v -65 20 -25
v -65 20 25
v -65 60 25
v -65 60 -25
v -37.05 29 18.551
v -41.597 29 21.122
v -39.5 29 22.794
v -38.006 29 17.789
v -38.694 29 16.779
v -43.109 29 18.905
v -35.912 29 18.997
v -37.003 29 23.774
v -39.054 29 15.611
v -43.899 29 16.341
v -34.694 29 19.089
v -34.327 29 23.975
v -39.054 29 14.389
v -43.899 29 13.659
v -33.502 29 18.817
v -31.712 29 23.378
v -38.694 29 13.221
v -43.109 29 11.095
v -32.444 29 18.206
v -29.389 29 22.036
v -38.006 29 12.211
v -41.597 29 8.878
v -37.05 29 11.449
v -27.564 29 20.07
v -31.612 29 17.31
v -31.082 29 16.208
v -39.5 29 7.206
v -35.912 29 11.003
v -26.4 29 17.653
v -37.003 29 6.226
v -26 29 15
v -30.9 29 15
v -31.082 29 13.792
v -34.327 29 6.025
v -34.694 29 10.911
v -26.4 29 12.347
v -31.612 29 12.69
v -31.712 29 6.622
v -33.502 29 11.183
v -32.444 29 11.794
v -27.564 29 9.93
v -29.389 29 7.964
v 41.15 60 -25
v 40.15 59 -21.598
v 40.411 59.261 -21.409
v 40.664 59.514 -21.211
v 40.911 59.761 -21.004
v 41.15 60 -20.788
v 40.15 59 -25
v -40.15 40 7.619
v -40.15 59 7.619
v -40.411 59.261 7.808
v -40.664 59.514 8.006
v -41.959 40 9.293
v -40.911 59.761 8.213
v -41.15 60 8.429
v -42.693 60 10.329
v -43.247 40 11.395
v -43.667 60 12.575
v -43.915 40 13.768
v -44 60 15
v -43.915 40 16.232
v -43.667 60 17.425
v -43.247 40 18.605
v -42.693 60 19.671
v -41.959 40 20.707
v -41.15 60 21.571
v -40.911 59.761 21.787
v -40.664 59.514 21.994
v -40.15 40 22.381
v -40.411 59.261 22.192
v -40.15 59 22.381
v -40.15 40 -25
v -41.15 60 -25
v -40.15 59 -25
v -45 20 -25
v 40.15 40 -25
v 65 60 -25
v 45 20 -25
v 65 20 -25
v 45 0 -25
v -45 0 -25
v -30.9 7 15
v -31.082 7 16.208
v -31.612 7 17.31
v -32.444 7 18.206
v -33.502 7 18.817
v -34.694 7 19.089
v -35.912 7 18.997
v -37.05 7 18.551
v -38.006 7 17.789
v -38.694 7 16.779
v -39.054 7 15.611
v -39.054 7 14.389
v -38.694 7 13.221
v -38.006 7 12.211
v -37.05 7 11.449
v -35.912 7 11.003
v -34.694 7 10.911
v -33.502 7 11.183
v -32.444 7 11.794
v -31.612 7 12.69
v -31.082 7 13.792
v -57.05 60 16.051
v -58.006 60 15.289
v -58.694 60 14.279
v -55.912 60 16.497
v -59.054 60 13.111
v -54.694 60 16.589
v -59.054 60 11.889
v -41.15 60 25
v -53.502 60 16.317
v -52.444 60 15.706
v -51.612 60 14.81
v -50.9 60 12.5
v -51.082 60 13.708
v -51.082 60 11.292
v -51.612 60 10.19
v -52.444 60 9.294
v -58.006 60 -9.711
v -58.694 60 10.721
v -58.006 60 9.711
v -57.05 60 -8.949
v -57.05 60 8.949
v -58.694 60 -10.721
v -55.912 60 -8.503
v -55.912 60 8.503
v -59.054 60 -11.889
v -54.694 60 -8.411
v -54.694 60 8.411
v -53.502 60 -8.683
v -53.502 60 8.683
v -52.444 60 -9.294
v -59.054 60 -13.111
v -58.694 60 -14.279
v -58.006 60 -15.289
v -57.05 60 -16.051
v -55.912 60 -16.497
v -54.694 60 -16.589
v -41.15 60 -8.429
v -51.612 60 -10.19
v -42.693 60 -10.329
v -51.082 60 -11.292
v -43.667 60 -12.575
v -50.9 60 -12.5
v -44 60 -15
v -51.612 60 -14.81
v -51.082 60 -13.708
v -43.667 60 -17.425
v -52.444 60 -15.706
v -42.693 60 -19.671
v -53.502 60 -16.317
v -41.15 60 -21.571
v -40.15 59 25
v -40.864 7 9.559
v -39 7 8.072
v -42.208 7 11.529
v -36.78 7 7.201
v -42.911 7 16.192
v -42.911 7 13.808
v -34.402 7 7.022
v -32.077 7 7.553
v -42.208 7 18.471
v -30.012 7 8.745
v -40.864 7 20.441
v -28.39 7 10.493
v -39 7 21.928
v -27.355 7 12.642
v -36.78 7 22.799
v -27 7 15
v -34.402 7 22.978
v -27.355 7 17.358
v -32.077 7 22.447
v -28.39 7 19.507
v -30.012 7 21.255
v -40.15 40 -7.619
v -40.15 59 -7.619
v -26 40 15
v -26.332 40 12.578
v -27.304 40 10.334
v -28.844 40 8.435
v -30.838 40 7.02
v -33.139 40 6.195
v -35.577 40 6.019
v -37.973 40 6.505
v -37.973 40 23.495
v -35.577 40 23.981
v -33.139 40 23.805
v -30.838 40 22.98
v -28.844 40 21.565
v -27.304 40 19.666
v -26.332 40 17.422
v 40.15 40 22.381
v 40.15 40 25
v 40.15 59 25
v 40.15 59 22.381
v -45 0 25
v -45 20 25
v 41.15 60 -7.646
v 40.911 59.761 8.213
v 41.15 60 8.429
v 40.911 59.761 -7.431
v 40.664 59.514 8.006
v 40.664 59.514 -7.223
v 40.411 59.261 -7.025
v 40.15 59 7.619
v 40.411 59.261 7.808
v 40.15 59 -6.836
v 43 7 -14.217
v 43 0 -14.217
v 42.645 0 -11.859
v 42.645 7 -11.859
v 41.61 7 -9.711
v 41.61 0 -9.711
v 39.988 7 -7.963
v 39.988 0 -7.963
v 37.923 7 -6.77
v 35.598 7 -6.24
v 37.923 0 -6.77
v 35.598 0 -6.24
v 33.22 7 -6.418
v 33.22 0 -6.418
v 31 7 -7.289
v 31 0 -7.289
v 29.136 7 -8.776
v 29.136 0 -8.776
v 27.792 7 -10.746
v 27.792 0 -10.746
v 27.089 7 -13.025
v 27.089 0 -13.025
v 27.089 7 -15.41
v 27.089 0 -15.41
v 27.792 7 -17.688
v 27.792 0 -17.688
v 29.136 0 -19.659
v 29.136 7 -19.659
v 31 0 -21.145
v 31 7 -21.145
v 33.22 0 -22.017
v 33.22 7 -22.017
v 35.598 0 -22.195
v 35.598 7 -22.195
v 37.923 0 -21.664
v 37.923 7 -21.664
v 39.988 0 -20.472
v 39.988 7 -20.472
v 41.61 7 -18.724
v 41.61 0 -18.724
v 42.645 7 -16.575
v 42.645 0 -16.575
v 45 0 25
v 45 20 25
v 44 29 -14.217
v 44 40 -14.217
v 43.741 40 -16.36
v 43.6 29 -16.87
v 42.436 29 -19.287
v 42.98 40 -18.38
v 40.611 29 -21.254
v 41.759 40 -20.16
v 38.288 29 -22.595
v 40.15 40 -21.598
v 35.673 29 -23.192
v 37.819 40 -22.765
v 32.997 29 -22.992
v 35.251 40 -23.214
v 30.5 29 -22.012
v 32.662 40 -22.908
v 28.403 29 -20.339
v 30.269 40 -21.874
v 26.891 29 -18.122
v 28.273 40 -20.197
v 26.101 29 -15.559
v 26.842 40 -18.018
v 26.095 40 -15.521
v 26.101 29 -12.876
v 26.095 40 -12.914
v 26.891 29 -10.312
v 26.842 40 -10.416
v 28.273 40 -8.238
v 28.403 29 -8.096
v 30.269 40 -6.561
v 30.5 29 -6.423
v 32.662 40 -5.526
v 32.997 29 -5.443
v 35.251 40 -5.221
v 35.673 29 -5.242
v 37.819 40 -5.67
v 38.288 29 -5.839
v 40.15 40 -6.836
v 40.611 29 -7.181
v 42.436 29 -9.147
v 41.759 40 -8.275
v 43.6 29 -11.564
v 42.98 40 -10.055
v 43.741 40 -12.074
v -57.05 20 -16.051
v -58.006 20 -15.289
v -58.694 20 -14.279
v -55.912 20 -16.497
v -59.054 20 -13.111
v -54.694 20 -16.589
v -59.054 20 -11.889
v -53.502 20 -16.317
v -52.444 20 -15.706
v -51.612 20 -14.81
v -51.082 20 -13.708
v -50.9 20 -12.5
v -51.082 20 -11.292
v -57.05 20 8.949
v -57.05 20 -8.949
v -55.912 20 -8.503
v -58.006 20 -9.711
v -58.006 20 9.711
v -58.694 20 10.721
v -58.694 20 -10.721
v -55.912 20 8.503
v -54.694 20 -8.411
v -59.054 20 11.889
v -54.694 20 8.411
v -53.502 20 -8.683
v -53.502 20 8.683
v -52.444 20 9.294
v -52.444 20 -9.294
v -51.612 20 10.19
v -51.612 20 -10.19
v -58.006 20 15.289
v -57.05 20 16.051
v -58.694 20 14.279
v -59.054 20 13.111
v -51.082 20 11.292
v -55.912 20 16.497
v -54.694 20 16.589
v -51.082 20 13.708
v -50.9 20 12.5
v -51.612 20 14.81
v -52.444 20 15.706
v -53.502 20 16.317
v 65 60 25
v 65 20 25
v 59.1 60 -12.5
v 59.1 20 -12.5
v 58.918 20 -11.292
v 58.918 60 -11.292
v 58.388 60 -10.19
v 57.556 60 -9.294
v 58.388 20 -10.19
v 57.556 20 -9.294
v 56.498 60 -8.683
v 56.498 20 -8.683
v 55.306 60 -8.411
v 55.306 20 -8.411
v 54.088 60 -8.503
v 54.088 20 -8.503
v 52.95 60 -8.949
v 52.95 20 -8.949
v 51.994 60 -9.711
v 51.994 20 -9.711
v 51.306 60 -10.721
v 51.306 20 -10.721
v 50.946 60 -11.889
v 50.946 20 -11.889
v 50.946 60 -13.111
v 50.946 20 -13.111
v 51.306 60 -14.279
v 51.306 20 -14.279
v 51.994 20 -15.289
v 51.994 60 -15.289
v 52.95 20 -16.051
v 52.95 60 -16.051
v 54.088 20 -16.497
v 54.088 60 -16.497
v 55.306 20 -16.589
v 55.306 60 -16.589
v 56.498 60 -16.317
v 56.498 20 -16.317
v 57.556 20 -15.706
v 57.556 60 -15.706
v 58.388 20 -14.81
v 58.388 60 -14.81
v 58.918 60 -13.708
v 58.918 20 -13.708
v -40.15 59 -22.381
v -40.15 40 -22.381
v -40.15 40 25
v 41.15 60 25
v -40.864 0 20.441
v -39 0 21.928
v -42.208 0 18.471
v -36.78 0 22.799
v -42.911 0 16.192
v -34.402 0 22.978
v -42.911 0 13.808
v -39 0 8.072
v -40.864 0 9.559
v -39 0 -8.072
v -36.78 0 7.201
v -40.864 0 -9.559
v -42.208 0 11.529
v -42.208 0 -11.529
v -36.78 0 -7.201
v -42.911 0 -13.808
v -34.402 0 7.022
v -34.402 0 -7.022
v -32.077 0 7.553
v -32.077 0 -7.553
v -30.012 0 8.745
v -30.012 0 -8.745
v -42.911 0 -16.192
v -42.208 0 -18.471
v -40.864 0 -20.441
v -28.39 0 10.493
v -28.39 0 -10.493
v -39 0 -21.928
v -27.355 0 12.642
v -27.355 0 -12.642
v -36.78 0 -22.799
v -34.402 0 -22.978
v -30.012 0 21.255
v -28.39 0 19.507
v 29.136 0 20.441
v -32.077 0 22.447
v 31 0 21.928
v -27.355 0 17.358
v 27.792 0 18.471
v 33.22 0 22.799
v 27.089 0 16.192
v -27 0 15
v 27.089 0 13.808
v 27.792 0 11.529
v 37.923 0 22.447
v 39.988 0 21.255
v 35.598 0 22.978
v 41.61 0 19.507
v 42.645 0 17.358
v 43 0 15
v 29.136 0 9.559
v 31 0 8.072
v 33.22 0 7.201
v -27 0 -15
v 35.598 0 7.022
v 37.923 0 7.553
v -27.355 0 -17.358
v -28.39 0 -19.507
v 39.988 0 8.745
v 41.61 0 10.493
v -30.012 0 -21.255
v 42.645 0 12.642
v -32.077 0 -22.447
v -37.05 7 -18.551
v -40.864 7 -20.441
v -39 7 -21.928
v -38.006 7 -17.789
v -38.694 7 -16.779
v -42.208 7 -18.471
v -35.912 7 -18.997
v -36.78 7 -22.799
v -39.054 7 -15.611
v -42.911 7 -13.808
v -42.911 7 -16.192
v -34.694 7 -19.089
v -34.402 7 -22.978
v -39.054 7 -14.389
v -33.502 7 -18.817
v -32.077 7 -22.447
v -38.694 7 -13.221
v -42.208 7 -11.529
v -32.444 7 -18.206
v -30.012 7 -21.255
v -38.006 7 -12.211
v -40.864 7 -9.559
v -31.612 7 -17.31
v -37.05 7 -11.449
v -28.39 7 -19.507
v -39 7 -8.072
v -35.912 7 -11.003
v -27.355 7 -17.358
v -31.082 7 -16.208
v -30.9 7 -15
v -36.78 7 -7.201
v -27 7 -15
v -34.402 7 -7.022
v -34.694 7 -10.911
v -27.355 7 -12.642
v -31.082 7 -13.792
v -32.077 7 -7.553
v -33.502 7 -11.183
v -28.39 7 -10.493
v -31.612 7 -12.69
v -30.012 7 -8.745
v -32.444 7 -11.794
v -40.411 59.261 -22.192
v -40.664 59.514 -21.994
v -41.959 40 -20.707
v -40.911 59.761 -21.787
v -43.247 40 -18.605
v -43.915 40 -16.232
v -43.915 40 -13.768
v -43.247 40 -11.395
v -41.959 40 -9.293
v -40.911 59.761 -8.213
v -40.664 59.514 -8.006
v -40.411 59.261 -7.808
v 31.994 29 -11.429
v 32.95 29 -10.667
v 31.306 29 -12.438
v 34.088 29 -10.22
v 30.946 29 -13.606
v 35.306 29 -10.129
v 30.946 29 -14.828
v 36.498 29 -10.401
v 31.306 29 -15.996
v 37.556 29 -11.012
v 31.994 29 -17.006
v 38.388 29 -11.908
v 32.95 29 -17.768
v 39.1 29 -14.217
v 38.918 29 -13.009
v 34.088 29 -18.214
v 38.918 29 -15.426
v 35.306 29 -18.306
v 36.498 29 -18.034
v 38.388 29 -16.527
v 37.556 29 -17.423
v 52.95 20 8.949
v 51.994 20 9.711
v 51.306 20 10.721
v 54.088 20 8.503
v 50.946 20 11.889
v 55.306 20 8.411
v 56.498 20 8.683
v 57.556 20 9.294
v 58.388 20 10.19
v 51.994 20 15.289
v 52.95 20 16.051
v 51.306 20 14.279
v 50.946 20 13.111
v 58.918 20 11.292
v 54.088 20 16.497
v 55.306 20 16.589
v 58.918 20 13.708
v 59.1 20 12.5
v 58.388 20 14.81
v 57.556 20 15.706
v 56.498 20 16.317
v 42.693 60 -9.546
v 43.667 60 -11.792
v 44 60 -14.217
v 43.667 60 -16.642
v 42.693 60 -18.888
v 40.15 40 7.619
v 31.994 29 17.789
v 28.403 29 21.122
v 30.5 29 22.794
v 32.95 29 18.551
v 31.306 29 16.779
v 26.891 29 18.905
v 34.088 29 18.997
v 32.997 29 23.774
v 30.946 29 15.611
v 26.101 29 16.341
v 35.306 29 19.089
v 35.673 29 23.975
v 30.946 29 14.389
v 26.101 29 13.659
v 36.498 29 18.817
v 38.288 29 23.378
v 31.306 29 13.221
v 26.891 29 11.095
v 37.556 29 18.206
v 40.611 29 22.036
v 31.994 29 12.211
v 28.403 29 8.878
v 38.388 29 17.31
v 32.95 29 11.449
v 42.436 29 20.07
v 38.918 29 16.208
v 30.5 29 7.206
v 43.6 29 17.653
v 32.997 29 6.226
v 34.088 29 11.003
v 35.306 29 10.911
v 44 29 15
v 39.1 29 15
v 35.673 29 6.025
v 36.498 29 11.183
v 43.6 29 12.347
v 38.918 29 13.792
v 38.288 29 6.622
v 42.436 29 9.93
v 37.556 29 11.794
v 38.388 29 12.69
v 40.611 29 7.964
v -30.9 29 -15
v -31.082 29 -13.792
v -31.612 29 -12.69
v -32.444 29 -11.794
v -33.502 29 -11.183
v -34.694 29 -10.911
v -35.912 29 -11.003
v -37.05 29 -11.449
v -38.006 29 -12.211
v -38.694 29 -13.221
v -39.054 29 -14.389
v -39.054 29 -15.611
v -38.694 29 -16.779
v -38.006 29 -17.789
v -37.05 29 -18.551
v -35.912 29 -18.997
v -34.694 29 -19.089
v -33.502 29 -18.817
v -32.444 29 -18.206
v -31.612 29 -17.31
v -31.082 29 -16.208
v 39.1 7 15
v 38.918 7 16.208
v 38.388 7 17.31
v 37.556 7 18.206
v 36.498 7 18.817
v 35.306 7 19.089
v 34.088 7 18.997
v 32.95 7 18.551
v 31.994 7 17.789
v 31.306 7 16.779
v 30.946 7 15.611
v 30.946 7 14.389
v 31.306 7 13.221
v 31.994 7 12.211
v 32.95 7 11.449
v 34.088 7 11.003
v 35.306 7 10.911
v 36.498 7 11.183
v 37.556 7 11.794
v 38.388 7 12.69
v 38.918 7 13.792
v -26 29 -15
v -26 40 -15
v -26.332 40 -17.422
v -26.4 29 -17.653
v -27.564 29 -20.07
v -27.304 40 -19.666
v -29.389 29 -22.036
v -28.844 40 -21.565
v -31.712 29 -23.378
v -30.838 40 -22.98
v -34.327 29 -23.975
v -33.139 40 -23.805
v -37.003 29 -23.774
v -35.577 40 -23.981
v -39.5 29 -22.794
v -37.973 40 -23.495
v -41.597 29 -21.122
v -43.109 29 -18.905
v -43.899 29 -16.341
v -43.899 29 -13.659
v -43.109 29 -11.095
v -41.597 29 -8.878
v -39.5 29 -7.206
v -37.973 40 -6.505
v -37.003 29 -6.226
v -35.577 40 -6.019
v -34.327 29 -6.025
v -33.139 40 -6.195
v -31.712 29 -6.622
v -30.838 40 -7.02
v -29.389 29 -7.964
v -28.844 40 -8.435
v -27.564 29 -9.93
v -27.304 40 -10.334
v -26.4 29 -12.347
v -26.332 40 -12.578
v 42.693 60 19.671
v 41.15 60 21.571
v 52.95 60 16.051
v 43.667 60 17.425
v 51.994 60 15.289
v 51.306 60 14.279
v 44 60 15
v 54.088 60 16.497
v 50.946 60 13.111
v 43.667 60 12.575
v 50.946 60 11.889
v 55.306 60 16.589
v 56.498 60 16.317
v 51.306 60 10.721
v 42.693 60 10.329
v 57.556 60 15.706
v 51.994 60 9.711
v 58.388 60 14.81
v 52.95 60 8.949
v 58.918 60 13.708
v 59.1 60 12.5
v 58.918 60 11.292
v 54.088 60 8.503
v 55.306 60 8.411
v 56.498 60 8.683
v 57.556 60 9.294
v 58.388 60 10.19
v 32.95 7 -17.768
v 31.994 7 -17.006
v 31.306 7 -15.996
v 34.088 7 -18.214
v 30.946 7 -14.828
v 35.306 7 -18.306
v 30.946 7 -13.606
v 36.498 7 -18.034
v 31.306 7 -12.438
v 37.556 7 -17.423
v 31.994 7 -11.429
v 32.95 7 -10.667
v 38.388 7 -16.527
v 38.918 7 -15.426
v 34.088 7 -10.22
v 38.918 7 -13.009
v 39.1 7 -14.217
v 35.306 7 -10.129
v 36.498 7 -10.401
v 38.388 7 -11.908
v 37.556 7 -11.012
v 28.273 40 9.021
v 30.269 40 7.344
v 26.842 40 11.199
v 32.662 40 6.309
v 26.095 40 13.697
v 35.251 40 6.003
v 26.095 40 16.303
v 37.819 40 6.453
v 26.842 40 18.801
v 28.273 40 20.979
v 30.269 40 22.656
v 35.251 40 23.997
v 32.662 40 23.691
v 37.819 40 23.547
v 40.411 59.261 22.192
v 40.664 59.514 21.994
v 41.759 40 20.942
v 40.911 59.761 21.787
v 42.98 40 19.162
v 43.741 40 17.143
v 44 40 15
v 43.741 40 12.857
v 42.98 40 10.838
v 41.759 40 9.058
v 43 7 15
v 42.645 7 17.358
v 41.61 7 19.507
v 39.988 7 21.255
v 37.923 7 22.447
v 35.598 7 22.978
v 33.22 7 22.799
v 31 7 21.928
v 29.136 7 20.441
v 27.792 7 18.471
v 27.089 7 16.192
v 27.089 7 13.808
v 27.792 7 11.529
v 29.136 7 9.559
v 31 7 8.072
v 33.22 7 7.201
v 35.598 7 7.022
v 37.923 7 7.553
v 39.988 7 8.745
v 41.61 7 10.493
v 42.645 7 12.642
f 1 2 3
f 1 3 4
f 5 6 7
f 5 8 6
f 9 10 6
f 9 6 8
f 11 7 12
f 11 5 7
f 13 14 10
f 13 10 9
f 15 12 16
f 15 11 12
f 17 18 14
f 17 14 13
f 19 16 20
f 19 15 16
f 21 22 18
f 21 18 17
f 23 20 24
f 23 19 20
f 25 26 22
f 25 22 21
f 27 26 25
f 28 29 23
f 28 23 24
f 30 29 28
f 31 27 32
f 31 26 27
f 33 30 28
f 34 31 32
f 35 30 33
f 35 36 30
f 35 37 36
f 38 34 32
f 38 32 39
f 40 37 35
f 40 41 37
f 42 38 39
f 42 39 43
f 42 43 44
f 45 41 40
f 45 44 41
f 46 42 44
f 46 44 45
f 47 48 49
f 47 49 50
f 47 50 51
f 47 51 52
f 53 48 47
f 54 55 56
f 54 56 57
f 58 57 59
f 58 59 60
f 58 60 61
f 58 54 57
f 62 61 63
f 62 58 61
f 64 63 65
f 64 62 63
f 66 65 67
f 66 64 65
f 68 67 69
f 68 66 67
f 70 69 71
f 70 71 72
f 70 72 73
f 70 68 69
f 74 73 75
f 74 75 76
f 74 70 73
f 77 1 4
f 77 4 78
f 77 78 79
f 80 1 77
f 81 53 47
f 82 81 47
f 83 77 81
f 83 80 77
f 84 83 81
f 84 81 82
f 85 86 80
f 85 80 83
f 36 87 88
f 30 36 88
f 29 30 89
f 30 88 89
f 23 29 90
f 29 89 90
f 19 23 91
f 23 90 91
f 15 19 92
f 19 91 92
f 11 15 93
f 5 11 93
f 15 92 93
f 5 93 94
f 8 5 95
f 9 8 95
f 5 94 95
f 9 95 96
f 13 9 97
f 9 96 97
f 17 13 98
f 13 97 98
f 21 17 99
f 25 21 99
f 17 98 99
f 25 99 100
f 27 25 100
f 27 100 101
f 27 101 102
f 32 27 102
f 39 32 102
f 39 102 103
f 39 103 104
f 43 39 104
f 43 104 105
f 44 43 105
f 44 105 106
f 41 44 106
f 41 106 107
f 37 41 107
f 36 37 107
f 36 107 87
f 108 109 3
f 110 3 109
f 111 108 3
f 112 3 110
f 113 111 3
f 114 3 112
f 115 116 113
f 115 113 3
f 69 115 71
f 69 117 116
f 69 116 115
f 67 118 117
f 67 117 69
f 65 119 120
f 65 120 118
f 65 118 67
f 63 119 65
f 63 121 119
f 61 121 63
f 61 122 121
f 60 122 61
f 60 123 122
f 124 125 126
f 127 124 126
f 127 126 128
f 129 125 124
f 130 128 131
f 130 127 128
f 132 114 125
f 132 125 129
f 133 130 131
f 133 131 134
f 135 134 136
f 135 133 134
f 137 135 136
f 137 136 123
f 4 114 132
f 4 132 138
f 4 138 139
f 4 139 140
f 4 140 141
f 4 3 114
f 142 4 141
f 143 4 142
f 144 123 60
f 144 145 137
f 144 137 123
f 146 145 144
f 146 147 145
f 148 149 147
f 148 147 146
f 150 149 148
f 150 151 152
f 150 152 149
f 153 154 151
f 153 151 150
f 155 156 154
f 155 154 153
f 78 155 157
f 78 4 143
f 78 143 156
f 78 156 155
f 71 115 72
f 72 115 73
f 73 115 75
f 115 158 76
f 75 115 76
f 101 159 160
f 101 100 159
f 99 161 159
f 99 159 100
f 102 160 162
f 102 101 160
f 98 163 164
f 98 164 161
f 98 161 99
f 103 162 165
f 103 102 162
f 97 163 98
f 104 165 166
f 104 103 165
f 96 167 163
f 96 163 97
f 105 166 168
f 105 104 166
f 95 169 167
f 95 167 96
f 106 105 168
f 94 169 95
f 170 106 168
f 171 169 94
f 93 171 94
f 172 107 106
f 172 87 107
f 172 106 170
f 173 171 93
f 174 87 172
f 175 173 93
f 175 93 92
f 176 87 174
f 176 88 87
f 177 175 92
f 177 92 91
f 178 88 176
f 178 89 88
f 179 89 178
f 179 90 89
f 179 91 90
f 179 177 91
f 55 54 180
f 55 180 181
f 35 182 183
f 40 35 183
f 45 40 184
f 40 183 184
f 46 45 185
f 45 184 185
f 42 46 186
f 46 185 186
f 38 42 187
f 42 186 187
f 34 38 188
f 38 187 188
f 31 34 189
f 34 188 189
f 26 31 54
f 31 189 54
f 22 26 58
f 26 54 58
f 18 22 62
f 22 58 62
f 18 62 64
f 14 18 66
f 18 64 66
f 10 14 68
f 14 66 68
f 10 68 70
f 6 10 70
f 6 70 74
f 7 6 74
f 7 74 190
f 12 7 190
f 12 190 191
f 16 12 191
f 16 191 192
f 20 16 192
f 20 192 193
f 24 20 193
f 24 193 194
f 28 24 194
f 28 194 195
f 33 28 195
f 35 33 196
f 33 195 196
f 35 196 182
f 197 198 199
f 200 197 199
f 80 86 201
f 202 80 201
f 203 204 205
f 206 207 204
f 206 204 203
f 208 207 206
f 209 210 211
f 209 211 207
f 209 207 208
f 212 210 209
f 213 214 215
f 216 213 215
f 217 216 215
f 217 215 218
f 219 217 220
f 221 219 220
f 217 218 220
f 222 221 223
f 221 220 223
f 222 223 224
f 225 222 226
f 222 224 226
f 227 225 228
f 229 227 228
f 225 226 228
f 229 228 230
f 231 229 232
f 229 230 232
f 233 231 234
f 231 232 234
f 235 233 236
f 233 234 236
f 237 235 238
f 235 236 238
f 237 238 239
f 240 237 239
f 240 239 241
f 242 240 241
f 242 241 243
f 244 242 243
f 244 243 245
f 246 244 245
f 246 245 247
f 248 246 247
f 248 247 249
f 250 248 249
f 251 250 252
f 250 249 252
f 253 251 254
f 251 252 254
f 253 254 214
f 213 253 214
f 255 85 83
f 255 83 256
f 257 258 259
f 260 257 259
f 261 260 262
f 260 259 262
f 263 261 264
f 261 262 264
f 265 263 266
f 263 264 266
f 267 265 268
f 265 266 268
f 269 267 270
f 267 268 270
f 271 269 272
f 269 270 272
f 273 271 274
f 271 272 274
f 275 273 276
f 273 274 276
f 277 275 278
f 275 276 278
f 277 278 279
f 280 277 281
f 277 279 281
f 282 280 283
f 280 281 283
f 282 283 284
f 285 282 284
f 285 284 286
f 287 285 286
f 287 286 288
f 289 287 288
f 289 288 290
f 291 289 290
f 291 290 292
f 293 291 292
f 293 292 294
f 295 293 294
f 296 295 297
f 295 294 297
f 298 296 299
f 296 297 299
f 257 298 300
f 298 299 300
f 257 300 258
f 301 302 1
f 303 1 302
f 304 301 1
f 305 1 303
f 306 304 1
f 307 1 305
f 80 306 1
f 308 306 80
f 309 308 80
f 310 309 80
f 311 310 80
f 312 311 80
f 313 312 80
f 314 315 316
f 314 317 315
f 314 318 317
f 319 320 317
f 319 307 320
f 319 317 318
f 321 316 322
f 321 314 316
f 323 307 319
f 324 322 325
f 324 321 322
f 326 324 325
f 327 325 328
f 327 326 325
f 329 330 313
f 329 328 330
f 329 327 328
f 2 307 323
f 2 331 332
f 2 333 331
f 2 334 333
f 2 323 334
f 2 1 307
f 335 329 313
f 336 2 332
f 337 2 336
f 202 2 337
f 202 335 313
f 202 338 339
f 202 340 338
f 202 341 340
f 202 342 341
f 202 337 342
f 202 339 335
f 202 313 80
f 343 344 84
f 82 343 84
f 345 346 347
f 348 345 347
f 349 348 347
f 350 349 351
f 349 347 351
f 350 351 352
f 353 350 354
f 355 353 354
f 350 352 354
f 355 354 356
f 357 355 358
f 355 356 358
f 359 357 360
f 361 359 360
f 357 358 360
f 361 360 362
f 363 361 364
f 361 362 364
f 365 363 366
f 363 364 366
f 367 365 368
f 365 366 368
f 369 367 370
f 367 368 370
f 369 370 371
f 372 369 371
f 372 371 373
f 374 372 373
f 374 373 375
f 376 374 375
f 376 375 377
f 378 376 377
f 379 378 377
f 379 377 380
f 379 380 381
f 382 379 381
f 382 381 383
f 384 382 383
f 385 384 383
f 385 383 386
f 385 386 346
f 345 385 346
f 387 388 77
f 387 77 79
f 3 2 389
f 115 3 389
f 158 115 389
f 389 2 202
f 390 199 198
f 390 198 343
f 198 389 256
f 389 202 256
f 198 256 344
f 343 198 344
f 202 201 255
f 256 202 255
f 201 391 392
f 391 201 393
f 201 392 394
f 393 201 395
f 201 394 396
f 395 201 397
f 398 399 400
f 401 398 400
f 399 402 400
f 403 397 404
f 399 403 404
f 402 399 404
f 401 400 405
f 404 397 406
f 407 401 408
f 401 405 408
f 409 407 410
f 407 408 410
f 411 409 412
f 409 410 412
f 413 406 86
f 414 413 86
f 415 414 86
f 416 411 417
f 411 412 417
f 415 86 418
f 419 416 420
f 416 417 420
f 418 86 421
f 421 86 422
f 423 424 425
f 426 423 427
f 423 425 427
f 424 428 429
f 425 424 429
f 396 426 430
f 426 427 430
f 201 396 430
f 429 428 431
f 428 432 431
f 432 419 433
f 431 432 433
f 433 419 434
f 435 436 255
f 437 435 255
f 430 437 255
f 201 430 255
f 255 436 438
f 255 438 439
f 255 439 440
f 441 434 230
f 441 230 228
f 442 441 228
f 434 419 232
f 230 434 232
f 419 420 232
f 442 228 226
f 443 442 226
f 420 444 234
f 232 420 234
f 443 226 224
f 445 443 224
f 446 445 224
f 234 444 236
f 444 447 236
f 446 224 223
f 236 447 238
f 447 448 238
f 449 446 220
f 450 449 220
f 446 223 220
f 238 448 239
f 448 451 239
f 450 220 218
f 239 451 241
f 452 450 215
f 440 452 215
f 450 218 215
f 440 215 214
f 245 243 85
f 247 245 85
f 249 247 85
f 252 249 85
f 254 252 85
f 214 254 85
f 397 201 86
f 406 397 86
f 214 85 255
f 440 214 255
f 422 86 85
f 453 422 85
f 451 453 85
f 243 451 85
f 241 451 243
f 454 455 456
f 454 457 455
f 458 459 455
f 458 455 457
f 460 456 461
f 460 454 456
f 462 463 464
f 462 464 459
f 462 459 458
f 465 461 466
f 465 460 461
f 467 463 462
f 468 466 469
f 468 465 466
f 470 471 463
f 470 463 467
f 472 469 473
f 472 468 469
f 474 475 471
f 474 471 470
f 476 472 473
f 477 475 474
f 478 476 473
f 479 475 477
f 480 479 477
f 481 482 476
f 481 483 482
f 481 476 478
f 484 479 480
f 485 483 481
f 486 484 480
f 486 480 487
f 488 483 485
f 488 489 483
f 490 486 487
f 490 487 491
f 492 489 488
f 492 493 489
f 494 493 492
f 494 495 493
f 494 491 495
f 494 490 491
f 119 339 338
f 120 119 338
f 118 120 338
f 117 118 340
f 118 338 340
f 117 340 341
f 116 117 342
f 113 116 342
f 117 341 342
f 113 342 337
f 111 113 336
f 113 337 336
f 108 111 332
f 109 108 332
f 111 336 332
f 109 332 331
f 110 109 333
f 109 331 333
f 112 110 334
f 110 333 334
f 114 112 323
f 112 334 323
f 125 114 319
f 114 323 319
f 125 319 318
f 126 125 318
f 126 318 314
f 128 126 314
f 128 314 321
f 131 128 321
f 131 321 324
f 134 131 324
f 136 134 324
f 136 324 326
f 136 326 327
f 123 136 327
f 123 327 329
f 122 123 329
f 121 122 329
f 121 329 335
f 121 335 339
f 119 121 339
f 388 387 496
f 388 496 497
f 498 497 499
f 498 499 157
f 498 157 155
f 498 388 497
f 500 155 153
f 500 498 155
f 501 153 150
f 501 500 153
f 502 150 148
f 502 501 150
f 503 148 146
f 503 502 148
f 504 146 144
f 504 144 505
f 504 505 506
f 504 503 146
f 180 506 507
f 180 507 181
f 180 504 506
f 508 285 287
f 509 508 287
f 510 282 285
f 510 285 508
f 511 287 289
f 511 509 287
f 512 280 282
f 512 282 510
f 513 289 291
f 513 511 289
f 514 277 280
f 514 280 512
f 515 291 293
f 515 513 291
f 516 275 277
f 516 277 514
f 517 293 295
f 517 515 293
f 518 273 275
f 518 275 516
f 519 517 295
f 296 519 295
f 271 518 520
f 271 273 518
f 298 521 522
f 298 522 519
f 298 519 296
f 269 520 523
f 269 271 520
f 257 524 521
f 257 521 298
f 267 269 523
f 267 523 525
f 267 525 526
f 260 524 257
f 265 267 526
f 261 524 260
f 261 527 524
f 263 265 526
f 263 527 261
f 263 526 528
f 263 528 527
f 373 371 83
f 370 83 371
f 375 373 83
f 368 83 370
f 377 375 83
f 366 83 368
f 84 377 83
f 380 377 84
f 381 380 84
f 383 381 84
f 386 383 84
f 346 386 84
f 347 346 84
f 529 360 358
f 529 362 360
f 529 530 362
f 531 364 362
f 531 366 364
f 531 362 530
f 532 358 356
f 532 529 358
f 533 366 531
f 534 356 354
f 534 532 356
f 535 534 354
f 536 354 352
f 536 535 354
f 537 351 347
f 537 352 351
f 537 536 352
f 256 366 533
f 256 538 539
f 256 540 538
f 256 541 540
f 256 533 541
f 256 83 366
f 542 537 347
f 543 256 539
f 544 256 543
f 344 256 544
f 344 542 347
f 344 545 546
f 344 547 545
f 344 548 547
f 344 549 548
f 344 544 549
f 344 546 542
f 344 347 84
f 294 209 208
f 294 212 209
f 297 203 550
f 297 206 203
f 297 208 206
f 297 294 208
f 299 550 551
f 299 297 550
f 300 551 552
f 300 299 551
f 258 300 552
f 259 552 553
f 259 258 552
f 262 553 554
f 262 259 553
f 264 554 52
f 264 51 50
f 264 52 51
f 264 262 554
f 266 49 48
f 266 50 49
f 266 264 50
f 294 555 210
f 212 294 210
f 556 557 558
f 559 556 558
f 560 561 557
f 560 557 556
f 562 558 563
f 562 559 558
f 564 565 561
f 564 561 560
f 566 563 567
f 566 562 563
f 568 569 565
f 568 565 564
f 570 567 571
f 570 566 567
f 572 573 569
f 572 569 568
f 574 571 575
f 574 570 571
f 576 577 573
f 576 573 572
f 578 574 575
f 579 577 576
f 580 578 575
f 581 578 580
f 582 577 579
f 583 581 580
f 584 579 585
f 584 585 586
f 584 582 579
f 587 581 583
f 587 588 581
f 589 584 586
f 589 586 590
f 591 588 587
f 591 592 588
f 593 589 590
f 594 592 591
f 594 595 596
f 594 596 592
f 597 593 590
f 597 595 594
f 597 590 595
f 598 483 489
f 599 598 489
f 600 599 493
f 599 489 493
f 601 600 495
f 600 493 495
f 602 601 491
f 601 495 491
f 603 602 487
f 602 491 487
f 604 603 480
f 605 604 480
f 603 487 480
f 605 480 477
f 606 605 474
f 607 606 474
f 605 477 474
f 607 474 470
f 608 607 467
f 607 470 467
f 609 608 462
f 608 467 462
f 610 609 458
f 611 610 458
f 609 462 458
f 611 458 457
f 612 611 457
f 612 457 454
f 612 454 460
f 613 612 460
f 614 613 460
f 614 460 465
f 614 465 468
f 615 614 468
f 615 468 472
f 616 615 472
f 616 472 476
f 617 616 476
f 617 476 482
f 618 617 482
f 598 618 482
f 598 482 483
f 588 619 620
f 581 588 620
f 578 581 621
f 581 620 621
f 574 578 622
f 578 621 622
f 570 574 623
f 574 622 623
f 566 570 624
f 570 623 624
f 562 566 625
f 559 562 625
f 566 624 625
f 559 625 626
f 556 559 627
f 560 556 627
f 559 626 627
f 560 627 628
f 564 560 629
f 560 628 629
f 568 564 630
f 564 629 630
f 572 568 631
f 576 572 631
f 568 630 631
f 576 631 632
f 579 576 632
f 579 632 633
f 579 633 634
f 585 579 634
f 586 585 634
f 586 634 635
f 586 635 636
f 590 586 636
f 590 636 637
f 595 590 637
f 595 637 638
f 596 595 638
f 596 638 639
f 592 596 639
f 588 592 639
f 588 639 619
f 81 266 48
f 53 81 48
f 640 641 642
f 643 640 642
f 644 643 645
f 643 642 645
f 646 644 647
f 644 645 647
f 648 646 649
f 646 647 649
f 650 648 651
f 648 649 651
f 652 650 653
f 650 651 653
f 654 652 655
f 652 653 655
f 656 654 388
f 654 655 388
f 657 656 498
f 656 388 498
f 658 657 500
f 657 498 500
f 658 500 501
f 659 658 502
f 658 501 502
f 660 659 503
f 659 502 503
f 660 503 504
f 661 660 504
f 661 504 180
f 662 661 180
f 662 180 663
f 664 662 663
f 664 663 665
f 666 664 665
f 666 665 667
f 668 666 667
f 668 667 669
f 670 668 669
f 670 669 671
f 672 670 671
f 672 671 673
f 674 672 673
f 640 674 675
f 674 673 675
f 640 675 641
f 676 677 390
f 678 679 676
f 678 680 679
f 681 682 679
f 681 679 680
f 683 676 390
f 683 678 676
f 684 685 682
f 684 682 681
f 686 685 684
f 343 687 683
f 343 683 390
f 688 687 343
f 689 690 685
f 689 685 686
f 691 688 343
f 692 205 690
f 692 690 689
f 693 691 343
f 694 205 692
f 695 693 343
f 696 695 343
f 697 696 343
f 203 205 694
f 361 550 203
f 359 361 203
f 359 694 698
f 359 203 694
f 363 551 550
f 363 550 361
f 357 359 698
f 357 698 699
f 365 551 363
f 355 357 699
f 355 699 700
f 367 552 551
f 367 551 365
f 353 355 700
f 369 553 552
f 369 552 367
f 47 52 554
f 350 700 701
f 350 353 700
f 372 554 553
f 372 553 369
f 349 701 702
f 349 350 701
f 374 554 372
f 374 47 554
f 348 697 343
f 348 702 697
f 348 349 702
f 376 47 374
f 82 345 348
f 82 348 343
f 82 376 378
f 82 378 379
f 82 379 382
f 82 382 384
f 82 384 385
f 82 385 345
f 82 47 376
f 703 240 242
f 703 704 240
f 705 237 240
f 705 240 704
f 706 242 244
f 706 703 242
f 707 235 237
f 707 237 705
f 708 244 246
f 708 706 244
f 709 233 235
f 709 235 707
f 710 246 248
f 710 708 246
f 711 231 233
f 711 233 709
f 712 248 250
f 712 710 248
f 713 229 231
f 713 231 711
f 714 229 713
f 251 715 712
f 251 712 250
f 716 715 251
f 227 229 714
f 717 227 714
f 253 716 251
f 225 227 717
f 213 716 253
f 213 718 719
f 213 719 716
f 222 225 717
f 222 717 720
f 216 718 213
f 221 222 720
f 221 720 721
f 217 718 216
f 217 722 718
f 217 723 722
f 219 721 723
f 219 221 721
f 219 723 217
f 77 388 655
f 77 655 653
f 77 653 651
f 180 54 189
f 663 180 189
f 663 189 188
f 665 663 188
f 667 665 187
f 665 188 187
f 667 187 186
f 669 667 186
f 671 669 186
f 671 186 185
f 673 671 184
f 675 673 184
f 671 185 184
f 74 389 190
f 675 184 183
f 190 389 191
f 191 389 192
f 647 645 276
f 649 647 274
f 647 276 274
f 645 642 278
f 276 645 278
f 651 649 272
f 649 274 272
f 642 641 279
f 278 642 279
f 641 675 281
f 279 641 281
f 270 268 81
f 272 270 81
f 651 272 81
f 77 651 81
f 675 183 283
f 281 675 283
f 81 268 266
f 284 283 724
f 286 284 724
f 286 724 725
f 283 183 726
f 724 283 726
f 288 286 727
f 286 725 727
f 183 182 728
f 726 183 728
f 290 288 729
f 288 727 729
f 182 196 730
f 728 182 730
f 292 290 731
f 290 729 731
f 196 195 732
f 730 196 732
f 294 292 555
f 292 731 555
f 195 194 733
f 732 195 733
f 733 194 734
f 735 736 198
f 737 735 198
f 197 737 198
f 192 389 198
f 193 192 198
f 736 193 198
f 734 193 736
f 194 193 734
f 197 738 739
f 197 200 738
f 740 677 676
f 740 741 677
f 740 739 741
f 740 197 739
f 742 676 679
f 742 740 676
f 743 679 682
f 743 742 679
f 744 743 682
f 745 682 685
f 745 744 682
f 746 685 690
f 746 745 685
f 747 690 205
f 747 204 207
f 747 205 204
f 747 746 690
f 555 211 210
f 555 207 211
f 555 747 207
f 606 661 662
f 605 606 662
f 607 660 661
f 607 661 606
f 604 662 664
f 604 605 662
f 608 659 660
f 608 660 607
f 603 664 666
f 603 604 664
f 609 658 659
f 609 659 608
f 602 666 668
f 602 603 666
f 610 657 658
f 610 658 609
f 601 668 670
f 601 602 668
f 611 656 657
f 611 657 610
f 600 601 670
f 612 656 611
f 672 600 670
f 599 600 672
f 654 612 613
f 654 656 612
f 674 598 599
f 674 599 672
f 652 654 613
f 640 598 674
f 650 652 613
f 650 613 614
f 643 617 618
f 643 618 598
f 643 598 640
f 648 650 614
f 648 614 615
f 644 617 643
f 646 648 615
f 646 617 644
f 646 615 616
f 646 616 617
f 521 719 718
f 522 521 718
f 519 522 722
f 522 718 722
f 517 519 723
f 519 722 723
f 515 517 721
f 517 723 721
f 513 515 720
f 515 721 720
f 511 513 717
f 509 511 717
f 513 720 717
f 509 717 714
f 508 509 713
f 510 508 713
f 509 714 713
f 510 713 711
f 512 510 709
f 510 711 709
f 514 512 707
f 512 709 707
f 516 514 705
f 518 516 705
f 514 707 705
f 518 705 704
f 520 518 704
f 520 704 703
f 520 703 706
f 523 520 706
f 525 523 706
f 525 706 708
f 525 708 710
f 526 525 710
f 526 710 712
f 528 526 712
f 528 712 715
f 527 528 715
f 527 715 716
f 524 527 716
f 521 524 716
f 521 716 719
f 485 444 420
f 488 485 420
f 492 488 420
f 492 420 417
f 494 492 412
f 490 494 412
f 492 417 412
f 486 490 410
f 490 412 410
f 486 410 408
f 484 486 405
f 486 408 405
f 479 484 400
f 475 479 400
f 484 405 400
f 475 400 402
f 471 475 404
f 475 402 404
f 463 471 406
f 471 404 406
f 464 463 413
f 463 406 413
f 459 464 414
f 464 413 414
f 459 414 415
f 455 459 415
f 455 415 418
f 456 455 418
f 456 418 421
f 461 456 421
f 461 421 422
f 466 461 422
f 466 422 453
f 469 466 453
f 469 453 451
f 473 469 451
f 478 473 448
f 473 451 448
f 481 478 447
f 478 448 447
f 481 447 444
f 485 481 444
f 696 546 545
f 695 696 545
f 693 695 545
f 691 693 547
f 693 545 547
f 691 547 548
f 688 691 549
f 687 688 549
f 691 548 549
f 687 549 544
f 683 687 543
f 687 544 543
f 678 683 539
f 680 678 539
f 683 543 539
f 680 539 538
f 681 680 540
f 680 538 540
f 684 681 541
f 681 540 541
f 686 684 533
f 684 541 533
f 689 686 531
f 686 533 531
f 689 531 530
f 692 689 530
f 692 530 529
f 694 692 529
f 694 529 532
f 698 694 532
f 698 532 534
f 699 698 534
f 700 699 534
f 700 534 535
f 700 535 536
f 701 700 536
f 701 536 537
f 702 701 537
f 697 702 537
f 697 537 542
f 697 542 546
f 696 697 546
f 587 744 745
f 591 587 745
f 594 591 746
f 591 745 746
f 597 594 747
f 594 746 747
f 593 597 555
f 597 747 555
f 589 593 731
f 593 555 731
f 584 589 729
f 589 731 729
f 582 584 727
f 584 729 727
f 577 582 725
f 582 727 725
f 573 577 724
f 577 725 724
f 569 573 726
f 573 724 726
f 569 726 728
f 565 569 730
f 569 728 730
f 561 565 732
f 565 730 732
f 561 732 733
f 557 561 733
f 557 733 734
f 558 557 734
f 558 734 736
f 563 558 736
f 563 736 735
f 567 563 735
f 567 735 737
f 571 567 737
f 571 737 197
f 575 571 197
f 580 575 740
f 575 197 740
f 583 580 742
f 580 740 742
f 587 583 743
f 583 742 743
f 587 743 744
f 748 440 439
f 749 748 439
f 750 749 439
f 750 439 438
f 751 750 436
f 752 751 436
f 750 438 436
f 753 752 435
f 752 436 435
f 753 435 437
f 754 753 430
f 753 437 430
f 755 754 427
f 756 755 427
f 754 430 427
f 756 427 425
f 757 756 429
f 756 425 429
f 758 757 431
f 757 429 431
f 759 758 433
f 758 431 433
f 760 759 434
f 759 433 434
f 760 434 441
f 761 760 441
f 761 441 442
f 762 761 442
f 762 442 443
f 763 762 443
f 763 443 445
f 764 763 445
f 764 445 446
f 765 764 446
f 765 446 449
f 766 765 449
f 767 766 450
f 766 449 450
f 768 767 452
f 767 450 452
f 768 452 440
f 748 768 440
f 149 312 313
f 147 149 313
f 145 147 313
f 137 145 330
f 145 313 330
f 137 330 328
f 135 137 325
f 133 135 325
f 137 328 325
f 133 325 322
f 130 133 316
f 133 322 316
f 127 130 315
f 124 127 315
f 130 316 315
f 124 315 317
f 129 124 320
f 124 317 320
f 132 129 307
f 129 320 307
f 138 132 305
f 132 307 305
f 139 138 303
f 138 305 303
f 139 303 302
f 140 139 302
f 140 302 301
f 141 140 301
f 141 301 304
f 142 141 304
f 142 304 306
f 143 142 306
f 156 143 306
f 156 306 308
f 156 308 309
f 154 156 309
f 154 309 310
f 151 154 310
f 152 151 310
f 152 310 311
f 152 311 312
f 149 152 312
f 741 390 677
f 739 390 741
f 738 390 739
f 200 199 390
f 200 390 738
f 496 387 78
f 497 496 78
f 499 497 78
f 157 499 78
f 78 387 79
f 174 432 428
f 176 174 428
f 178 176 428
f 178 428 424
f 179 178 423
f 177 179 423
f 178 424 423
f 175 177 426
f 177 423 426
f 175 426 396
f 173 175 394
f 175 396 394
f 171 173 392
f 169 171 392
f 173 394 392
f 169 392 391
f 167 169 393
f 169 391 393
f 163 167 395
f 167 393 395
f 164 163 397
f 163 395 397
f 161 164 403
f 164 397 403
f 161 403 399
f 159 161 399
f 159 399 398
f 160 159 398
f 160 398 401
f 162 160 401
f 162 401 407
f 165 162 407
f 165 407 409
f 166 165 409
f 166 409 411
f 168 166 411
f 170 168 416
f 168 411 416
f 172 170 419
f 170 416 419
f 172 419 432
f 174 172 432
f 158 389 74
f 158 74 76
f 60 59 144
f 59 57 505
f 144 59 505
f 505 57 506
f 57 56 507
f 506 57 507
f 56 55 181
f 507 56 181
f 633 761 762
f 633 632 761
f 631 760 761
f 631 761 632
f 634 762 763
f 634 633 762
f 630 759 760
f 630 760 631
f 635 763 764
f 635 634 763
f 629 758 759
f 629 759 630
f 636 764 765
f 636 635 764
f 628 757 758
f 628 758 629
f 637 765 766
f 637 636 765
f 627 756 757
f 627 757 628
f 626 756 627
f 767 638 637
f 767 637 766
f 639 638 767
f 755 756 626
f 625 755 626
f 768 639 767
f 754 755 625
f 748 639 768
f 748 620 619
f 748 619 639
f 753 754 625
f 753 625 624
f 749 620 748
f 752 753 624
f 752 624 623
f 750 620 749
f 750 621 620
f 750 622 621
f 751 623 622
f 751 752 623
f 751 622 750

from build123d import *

# Parameters (mm, degrees)
SKETCH1_W               = 130
SKETCH1_H               = 50
BOSS_EXTRUDE1_DEPTH     = 60
SKETCH2_W               = 80.3
SKETCH2_H               = 40
CUT_EXTRUDE1_DEPTH      = 51
SKETCH3_R               = 4.1
CUT_EXTRUDE2_DEPTH      = 61
SKETCH4_R               = 8
CUT_EXTRUDE3_DEPTH      = 7
CHAMFER1_SIZE           = 1
SKETCH5_OUTSIDE_W       = 162.332
SKETCH5_OUTSIDE_H       = 82.332
SKETCH5_OUTSIDE_W_2     = 90
SKETCH5_OUTSIDE_H_2     = 50
CUT_EXTRUDE4_DEPTH      = 20
SKETCH6_R               = 4.1
CUT_EXTRUDE5_DEPTH      = 41
SKETCH7_R               = 9
CUT_EXTRUDE6_DEPTH      = 21
CUT_EXTRUDE6_DEPTH_BACK = 11


with BuildPart() as part:
    # Sketch1 → Boss-Extrude1 (new body)
    with BuildSketch(Plane(origin=(0, 0, 0), x_dir=(1, 0, 0), z_dir=(0, 1, 0))):
        Rectangle(SKETCH1_W, SKETCH1_H)
    extrude(amount=BOSS_EXTRUDE1_DEPTH)

    # Sketch2 → Cut-Extrude1 (cut, through all)
    with BuildSketch(Plane.XY.offset(25)):
        with Locations((0, 60)):
            Rectangle(SKETCH2_W, SKETCH2_H)
    extrude(amount=-CUT_EXTRUDE1_DEPTH, mode=Mode.SUBTRACT)

    # Sketch3 → Cut-Extrude2 (cut, through all)
    with BuildSketch(Plane.XZ):
        with Locations((-35, 15)):
            Circle(SKETCH3_R)
        with Locations((-35, -15)):
            Circle(SKETCH3_R)
        with Locations((35, -14.217273236)):
            Circle(SKETCH3_R)
        with Locations((35, 15)):
            Circle(SKETCH3_R)
    extrude(amount=-CUT_EXTRUDE2_DEPTH, mode=Mode.SUBTRACT)

    # Sketch4 → Cut-Extrude3 (cut)
    with BuildSketch(Plane.XZ):
        with Locations((35, 15)):
            Circle(SKETCH4_R)
        with Locations((35, -14.217273236)):
            Circle(SKETCH4_R)
        with Locations((-35, 15)):
            Circle(SKETCH4_R)
        with Locations((-35, -15)):
            Circle(SKETCH4_R)
    extrude(amount=-CUT_EXTRUDE3_DEPTH, mode=Mode.SUBTRACT)

    # Chamfer1
    chamfer1_edges = [part.edges().sort_by_distance(p)[0] for p in [
        (40.15, 60, 0),
        (-40.15, 60, 0),
    ]]
    chamfer(chamfer1_edges, length=CHAMFER1_SIZE)

    # Sketch5 outside → Cut-Extrude4 (cut)
    with BuildSketch(Plane.XZ):
        Rectangle(SKETCH5_OUTSIDE_W, SKETCH5_OUTSIDE_H)
        Rectangle(SKETCH5_OUTSIDE_W_2, SKETCH5_OUTSIDE_H_2, mode=Mode.SUBTRACT)
    extrude(amount=-CUT_EXTRUDE4_DEPTH, mode=Mode.SUBTRACT)

    # Sketch6 → Cut-Extrude5 (cut, through all)
    with BuildSketch(Plane.XZ.offset(-20)):
        with Locations((55, -12.5)):
            Circle(SKETCH6_R)
        with Locations((55, 12.5)):
            Circle(SKETCH6_R)
        with Locations((-55, -12.5)):
            Circle(SKETCH6_R)
        with Locations((-55, 12.5)):
            Circle(SKETCH6_R)
    extrude(amount=-CUT_EXTRUDE5_DEPTH, mode=Mode.SUBTRACT)

    # Sketch7 → Cut-Extrude6 (cut, two sides)
    with BuildSketch(Plane(origin=(0, 40, 0), x_dir=(1, 0, 0), z_dir=(0, 1, 0))) as cut_extrude6_sk:
        with Locations((35, -15)):
            Circle(SKETCH7_R)
        with Locations((-35, -15)):
            Circle(SKETCH7_R)
        with Locations((35, 14.217273236)):
            Circle(SKETCH7_R)
        with Locations((-35, 15)):
            Circle(SKETCH7_R)
    extrude(amount=CUT_EXTRUDE6_DEPTH, mode=Mode.SUBTRACT)
    extrude(cut_extrude6_sk.sketch, amount=-CUT_EXTRUDE6_DEPTH_BACK, mode=Mode.SUBTRACT)


solid = part.part
